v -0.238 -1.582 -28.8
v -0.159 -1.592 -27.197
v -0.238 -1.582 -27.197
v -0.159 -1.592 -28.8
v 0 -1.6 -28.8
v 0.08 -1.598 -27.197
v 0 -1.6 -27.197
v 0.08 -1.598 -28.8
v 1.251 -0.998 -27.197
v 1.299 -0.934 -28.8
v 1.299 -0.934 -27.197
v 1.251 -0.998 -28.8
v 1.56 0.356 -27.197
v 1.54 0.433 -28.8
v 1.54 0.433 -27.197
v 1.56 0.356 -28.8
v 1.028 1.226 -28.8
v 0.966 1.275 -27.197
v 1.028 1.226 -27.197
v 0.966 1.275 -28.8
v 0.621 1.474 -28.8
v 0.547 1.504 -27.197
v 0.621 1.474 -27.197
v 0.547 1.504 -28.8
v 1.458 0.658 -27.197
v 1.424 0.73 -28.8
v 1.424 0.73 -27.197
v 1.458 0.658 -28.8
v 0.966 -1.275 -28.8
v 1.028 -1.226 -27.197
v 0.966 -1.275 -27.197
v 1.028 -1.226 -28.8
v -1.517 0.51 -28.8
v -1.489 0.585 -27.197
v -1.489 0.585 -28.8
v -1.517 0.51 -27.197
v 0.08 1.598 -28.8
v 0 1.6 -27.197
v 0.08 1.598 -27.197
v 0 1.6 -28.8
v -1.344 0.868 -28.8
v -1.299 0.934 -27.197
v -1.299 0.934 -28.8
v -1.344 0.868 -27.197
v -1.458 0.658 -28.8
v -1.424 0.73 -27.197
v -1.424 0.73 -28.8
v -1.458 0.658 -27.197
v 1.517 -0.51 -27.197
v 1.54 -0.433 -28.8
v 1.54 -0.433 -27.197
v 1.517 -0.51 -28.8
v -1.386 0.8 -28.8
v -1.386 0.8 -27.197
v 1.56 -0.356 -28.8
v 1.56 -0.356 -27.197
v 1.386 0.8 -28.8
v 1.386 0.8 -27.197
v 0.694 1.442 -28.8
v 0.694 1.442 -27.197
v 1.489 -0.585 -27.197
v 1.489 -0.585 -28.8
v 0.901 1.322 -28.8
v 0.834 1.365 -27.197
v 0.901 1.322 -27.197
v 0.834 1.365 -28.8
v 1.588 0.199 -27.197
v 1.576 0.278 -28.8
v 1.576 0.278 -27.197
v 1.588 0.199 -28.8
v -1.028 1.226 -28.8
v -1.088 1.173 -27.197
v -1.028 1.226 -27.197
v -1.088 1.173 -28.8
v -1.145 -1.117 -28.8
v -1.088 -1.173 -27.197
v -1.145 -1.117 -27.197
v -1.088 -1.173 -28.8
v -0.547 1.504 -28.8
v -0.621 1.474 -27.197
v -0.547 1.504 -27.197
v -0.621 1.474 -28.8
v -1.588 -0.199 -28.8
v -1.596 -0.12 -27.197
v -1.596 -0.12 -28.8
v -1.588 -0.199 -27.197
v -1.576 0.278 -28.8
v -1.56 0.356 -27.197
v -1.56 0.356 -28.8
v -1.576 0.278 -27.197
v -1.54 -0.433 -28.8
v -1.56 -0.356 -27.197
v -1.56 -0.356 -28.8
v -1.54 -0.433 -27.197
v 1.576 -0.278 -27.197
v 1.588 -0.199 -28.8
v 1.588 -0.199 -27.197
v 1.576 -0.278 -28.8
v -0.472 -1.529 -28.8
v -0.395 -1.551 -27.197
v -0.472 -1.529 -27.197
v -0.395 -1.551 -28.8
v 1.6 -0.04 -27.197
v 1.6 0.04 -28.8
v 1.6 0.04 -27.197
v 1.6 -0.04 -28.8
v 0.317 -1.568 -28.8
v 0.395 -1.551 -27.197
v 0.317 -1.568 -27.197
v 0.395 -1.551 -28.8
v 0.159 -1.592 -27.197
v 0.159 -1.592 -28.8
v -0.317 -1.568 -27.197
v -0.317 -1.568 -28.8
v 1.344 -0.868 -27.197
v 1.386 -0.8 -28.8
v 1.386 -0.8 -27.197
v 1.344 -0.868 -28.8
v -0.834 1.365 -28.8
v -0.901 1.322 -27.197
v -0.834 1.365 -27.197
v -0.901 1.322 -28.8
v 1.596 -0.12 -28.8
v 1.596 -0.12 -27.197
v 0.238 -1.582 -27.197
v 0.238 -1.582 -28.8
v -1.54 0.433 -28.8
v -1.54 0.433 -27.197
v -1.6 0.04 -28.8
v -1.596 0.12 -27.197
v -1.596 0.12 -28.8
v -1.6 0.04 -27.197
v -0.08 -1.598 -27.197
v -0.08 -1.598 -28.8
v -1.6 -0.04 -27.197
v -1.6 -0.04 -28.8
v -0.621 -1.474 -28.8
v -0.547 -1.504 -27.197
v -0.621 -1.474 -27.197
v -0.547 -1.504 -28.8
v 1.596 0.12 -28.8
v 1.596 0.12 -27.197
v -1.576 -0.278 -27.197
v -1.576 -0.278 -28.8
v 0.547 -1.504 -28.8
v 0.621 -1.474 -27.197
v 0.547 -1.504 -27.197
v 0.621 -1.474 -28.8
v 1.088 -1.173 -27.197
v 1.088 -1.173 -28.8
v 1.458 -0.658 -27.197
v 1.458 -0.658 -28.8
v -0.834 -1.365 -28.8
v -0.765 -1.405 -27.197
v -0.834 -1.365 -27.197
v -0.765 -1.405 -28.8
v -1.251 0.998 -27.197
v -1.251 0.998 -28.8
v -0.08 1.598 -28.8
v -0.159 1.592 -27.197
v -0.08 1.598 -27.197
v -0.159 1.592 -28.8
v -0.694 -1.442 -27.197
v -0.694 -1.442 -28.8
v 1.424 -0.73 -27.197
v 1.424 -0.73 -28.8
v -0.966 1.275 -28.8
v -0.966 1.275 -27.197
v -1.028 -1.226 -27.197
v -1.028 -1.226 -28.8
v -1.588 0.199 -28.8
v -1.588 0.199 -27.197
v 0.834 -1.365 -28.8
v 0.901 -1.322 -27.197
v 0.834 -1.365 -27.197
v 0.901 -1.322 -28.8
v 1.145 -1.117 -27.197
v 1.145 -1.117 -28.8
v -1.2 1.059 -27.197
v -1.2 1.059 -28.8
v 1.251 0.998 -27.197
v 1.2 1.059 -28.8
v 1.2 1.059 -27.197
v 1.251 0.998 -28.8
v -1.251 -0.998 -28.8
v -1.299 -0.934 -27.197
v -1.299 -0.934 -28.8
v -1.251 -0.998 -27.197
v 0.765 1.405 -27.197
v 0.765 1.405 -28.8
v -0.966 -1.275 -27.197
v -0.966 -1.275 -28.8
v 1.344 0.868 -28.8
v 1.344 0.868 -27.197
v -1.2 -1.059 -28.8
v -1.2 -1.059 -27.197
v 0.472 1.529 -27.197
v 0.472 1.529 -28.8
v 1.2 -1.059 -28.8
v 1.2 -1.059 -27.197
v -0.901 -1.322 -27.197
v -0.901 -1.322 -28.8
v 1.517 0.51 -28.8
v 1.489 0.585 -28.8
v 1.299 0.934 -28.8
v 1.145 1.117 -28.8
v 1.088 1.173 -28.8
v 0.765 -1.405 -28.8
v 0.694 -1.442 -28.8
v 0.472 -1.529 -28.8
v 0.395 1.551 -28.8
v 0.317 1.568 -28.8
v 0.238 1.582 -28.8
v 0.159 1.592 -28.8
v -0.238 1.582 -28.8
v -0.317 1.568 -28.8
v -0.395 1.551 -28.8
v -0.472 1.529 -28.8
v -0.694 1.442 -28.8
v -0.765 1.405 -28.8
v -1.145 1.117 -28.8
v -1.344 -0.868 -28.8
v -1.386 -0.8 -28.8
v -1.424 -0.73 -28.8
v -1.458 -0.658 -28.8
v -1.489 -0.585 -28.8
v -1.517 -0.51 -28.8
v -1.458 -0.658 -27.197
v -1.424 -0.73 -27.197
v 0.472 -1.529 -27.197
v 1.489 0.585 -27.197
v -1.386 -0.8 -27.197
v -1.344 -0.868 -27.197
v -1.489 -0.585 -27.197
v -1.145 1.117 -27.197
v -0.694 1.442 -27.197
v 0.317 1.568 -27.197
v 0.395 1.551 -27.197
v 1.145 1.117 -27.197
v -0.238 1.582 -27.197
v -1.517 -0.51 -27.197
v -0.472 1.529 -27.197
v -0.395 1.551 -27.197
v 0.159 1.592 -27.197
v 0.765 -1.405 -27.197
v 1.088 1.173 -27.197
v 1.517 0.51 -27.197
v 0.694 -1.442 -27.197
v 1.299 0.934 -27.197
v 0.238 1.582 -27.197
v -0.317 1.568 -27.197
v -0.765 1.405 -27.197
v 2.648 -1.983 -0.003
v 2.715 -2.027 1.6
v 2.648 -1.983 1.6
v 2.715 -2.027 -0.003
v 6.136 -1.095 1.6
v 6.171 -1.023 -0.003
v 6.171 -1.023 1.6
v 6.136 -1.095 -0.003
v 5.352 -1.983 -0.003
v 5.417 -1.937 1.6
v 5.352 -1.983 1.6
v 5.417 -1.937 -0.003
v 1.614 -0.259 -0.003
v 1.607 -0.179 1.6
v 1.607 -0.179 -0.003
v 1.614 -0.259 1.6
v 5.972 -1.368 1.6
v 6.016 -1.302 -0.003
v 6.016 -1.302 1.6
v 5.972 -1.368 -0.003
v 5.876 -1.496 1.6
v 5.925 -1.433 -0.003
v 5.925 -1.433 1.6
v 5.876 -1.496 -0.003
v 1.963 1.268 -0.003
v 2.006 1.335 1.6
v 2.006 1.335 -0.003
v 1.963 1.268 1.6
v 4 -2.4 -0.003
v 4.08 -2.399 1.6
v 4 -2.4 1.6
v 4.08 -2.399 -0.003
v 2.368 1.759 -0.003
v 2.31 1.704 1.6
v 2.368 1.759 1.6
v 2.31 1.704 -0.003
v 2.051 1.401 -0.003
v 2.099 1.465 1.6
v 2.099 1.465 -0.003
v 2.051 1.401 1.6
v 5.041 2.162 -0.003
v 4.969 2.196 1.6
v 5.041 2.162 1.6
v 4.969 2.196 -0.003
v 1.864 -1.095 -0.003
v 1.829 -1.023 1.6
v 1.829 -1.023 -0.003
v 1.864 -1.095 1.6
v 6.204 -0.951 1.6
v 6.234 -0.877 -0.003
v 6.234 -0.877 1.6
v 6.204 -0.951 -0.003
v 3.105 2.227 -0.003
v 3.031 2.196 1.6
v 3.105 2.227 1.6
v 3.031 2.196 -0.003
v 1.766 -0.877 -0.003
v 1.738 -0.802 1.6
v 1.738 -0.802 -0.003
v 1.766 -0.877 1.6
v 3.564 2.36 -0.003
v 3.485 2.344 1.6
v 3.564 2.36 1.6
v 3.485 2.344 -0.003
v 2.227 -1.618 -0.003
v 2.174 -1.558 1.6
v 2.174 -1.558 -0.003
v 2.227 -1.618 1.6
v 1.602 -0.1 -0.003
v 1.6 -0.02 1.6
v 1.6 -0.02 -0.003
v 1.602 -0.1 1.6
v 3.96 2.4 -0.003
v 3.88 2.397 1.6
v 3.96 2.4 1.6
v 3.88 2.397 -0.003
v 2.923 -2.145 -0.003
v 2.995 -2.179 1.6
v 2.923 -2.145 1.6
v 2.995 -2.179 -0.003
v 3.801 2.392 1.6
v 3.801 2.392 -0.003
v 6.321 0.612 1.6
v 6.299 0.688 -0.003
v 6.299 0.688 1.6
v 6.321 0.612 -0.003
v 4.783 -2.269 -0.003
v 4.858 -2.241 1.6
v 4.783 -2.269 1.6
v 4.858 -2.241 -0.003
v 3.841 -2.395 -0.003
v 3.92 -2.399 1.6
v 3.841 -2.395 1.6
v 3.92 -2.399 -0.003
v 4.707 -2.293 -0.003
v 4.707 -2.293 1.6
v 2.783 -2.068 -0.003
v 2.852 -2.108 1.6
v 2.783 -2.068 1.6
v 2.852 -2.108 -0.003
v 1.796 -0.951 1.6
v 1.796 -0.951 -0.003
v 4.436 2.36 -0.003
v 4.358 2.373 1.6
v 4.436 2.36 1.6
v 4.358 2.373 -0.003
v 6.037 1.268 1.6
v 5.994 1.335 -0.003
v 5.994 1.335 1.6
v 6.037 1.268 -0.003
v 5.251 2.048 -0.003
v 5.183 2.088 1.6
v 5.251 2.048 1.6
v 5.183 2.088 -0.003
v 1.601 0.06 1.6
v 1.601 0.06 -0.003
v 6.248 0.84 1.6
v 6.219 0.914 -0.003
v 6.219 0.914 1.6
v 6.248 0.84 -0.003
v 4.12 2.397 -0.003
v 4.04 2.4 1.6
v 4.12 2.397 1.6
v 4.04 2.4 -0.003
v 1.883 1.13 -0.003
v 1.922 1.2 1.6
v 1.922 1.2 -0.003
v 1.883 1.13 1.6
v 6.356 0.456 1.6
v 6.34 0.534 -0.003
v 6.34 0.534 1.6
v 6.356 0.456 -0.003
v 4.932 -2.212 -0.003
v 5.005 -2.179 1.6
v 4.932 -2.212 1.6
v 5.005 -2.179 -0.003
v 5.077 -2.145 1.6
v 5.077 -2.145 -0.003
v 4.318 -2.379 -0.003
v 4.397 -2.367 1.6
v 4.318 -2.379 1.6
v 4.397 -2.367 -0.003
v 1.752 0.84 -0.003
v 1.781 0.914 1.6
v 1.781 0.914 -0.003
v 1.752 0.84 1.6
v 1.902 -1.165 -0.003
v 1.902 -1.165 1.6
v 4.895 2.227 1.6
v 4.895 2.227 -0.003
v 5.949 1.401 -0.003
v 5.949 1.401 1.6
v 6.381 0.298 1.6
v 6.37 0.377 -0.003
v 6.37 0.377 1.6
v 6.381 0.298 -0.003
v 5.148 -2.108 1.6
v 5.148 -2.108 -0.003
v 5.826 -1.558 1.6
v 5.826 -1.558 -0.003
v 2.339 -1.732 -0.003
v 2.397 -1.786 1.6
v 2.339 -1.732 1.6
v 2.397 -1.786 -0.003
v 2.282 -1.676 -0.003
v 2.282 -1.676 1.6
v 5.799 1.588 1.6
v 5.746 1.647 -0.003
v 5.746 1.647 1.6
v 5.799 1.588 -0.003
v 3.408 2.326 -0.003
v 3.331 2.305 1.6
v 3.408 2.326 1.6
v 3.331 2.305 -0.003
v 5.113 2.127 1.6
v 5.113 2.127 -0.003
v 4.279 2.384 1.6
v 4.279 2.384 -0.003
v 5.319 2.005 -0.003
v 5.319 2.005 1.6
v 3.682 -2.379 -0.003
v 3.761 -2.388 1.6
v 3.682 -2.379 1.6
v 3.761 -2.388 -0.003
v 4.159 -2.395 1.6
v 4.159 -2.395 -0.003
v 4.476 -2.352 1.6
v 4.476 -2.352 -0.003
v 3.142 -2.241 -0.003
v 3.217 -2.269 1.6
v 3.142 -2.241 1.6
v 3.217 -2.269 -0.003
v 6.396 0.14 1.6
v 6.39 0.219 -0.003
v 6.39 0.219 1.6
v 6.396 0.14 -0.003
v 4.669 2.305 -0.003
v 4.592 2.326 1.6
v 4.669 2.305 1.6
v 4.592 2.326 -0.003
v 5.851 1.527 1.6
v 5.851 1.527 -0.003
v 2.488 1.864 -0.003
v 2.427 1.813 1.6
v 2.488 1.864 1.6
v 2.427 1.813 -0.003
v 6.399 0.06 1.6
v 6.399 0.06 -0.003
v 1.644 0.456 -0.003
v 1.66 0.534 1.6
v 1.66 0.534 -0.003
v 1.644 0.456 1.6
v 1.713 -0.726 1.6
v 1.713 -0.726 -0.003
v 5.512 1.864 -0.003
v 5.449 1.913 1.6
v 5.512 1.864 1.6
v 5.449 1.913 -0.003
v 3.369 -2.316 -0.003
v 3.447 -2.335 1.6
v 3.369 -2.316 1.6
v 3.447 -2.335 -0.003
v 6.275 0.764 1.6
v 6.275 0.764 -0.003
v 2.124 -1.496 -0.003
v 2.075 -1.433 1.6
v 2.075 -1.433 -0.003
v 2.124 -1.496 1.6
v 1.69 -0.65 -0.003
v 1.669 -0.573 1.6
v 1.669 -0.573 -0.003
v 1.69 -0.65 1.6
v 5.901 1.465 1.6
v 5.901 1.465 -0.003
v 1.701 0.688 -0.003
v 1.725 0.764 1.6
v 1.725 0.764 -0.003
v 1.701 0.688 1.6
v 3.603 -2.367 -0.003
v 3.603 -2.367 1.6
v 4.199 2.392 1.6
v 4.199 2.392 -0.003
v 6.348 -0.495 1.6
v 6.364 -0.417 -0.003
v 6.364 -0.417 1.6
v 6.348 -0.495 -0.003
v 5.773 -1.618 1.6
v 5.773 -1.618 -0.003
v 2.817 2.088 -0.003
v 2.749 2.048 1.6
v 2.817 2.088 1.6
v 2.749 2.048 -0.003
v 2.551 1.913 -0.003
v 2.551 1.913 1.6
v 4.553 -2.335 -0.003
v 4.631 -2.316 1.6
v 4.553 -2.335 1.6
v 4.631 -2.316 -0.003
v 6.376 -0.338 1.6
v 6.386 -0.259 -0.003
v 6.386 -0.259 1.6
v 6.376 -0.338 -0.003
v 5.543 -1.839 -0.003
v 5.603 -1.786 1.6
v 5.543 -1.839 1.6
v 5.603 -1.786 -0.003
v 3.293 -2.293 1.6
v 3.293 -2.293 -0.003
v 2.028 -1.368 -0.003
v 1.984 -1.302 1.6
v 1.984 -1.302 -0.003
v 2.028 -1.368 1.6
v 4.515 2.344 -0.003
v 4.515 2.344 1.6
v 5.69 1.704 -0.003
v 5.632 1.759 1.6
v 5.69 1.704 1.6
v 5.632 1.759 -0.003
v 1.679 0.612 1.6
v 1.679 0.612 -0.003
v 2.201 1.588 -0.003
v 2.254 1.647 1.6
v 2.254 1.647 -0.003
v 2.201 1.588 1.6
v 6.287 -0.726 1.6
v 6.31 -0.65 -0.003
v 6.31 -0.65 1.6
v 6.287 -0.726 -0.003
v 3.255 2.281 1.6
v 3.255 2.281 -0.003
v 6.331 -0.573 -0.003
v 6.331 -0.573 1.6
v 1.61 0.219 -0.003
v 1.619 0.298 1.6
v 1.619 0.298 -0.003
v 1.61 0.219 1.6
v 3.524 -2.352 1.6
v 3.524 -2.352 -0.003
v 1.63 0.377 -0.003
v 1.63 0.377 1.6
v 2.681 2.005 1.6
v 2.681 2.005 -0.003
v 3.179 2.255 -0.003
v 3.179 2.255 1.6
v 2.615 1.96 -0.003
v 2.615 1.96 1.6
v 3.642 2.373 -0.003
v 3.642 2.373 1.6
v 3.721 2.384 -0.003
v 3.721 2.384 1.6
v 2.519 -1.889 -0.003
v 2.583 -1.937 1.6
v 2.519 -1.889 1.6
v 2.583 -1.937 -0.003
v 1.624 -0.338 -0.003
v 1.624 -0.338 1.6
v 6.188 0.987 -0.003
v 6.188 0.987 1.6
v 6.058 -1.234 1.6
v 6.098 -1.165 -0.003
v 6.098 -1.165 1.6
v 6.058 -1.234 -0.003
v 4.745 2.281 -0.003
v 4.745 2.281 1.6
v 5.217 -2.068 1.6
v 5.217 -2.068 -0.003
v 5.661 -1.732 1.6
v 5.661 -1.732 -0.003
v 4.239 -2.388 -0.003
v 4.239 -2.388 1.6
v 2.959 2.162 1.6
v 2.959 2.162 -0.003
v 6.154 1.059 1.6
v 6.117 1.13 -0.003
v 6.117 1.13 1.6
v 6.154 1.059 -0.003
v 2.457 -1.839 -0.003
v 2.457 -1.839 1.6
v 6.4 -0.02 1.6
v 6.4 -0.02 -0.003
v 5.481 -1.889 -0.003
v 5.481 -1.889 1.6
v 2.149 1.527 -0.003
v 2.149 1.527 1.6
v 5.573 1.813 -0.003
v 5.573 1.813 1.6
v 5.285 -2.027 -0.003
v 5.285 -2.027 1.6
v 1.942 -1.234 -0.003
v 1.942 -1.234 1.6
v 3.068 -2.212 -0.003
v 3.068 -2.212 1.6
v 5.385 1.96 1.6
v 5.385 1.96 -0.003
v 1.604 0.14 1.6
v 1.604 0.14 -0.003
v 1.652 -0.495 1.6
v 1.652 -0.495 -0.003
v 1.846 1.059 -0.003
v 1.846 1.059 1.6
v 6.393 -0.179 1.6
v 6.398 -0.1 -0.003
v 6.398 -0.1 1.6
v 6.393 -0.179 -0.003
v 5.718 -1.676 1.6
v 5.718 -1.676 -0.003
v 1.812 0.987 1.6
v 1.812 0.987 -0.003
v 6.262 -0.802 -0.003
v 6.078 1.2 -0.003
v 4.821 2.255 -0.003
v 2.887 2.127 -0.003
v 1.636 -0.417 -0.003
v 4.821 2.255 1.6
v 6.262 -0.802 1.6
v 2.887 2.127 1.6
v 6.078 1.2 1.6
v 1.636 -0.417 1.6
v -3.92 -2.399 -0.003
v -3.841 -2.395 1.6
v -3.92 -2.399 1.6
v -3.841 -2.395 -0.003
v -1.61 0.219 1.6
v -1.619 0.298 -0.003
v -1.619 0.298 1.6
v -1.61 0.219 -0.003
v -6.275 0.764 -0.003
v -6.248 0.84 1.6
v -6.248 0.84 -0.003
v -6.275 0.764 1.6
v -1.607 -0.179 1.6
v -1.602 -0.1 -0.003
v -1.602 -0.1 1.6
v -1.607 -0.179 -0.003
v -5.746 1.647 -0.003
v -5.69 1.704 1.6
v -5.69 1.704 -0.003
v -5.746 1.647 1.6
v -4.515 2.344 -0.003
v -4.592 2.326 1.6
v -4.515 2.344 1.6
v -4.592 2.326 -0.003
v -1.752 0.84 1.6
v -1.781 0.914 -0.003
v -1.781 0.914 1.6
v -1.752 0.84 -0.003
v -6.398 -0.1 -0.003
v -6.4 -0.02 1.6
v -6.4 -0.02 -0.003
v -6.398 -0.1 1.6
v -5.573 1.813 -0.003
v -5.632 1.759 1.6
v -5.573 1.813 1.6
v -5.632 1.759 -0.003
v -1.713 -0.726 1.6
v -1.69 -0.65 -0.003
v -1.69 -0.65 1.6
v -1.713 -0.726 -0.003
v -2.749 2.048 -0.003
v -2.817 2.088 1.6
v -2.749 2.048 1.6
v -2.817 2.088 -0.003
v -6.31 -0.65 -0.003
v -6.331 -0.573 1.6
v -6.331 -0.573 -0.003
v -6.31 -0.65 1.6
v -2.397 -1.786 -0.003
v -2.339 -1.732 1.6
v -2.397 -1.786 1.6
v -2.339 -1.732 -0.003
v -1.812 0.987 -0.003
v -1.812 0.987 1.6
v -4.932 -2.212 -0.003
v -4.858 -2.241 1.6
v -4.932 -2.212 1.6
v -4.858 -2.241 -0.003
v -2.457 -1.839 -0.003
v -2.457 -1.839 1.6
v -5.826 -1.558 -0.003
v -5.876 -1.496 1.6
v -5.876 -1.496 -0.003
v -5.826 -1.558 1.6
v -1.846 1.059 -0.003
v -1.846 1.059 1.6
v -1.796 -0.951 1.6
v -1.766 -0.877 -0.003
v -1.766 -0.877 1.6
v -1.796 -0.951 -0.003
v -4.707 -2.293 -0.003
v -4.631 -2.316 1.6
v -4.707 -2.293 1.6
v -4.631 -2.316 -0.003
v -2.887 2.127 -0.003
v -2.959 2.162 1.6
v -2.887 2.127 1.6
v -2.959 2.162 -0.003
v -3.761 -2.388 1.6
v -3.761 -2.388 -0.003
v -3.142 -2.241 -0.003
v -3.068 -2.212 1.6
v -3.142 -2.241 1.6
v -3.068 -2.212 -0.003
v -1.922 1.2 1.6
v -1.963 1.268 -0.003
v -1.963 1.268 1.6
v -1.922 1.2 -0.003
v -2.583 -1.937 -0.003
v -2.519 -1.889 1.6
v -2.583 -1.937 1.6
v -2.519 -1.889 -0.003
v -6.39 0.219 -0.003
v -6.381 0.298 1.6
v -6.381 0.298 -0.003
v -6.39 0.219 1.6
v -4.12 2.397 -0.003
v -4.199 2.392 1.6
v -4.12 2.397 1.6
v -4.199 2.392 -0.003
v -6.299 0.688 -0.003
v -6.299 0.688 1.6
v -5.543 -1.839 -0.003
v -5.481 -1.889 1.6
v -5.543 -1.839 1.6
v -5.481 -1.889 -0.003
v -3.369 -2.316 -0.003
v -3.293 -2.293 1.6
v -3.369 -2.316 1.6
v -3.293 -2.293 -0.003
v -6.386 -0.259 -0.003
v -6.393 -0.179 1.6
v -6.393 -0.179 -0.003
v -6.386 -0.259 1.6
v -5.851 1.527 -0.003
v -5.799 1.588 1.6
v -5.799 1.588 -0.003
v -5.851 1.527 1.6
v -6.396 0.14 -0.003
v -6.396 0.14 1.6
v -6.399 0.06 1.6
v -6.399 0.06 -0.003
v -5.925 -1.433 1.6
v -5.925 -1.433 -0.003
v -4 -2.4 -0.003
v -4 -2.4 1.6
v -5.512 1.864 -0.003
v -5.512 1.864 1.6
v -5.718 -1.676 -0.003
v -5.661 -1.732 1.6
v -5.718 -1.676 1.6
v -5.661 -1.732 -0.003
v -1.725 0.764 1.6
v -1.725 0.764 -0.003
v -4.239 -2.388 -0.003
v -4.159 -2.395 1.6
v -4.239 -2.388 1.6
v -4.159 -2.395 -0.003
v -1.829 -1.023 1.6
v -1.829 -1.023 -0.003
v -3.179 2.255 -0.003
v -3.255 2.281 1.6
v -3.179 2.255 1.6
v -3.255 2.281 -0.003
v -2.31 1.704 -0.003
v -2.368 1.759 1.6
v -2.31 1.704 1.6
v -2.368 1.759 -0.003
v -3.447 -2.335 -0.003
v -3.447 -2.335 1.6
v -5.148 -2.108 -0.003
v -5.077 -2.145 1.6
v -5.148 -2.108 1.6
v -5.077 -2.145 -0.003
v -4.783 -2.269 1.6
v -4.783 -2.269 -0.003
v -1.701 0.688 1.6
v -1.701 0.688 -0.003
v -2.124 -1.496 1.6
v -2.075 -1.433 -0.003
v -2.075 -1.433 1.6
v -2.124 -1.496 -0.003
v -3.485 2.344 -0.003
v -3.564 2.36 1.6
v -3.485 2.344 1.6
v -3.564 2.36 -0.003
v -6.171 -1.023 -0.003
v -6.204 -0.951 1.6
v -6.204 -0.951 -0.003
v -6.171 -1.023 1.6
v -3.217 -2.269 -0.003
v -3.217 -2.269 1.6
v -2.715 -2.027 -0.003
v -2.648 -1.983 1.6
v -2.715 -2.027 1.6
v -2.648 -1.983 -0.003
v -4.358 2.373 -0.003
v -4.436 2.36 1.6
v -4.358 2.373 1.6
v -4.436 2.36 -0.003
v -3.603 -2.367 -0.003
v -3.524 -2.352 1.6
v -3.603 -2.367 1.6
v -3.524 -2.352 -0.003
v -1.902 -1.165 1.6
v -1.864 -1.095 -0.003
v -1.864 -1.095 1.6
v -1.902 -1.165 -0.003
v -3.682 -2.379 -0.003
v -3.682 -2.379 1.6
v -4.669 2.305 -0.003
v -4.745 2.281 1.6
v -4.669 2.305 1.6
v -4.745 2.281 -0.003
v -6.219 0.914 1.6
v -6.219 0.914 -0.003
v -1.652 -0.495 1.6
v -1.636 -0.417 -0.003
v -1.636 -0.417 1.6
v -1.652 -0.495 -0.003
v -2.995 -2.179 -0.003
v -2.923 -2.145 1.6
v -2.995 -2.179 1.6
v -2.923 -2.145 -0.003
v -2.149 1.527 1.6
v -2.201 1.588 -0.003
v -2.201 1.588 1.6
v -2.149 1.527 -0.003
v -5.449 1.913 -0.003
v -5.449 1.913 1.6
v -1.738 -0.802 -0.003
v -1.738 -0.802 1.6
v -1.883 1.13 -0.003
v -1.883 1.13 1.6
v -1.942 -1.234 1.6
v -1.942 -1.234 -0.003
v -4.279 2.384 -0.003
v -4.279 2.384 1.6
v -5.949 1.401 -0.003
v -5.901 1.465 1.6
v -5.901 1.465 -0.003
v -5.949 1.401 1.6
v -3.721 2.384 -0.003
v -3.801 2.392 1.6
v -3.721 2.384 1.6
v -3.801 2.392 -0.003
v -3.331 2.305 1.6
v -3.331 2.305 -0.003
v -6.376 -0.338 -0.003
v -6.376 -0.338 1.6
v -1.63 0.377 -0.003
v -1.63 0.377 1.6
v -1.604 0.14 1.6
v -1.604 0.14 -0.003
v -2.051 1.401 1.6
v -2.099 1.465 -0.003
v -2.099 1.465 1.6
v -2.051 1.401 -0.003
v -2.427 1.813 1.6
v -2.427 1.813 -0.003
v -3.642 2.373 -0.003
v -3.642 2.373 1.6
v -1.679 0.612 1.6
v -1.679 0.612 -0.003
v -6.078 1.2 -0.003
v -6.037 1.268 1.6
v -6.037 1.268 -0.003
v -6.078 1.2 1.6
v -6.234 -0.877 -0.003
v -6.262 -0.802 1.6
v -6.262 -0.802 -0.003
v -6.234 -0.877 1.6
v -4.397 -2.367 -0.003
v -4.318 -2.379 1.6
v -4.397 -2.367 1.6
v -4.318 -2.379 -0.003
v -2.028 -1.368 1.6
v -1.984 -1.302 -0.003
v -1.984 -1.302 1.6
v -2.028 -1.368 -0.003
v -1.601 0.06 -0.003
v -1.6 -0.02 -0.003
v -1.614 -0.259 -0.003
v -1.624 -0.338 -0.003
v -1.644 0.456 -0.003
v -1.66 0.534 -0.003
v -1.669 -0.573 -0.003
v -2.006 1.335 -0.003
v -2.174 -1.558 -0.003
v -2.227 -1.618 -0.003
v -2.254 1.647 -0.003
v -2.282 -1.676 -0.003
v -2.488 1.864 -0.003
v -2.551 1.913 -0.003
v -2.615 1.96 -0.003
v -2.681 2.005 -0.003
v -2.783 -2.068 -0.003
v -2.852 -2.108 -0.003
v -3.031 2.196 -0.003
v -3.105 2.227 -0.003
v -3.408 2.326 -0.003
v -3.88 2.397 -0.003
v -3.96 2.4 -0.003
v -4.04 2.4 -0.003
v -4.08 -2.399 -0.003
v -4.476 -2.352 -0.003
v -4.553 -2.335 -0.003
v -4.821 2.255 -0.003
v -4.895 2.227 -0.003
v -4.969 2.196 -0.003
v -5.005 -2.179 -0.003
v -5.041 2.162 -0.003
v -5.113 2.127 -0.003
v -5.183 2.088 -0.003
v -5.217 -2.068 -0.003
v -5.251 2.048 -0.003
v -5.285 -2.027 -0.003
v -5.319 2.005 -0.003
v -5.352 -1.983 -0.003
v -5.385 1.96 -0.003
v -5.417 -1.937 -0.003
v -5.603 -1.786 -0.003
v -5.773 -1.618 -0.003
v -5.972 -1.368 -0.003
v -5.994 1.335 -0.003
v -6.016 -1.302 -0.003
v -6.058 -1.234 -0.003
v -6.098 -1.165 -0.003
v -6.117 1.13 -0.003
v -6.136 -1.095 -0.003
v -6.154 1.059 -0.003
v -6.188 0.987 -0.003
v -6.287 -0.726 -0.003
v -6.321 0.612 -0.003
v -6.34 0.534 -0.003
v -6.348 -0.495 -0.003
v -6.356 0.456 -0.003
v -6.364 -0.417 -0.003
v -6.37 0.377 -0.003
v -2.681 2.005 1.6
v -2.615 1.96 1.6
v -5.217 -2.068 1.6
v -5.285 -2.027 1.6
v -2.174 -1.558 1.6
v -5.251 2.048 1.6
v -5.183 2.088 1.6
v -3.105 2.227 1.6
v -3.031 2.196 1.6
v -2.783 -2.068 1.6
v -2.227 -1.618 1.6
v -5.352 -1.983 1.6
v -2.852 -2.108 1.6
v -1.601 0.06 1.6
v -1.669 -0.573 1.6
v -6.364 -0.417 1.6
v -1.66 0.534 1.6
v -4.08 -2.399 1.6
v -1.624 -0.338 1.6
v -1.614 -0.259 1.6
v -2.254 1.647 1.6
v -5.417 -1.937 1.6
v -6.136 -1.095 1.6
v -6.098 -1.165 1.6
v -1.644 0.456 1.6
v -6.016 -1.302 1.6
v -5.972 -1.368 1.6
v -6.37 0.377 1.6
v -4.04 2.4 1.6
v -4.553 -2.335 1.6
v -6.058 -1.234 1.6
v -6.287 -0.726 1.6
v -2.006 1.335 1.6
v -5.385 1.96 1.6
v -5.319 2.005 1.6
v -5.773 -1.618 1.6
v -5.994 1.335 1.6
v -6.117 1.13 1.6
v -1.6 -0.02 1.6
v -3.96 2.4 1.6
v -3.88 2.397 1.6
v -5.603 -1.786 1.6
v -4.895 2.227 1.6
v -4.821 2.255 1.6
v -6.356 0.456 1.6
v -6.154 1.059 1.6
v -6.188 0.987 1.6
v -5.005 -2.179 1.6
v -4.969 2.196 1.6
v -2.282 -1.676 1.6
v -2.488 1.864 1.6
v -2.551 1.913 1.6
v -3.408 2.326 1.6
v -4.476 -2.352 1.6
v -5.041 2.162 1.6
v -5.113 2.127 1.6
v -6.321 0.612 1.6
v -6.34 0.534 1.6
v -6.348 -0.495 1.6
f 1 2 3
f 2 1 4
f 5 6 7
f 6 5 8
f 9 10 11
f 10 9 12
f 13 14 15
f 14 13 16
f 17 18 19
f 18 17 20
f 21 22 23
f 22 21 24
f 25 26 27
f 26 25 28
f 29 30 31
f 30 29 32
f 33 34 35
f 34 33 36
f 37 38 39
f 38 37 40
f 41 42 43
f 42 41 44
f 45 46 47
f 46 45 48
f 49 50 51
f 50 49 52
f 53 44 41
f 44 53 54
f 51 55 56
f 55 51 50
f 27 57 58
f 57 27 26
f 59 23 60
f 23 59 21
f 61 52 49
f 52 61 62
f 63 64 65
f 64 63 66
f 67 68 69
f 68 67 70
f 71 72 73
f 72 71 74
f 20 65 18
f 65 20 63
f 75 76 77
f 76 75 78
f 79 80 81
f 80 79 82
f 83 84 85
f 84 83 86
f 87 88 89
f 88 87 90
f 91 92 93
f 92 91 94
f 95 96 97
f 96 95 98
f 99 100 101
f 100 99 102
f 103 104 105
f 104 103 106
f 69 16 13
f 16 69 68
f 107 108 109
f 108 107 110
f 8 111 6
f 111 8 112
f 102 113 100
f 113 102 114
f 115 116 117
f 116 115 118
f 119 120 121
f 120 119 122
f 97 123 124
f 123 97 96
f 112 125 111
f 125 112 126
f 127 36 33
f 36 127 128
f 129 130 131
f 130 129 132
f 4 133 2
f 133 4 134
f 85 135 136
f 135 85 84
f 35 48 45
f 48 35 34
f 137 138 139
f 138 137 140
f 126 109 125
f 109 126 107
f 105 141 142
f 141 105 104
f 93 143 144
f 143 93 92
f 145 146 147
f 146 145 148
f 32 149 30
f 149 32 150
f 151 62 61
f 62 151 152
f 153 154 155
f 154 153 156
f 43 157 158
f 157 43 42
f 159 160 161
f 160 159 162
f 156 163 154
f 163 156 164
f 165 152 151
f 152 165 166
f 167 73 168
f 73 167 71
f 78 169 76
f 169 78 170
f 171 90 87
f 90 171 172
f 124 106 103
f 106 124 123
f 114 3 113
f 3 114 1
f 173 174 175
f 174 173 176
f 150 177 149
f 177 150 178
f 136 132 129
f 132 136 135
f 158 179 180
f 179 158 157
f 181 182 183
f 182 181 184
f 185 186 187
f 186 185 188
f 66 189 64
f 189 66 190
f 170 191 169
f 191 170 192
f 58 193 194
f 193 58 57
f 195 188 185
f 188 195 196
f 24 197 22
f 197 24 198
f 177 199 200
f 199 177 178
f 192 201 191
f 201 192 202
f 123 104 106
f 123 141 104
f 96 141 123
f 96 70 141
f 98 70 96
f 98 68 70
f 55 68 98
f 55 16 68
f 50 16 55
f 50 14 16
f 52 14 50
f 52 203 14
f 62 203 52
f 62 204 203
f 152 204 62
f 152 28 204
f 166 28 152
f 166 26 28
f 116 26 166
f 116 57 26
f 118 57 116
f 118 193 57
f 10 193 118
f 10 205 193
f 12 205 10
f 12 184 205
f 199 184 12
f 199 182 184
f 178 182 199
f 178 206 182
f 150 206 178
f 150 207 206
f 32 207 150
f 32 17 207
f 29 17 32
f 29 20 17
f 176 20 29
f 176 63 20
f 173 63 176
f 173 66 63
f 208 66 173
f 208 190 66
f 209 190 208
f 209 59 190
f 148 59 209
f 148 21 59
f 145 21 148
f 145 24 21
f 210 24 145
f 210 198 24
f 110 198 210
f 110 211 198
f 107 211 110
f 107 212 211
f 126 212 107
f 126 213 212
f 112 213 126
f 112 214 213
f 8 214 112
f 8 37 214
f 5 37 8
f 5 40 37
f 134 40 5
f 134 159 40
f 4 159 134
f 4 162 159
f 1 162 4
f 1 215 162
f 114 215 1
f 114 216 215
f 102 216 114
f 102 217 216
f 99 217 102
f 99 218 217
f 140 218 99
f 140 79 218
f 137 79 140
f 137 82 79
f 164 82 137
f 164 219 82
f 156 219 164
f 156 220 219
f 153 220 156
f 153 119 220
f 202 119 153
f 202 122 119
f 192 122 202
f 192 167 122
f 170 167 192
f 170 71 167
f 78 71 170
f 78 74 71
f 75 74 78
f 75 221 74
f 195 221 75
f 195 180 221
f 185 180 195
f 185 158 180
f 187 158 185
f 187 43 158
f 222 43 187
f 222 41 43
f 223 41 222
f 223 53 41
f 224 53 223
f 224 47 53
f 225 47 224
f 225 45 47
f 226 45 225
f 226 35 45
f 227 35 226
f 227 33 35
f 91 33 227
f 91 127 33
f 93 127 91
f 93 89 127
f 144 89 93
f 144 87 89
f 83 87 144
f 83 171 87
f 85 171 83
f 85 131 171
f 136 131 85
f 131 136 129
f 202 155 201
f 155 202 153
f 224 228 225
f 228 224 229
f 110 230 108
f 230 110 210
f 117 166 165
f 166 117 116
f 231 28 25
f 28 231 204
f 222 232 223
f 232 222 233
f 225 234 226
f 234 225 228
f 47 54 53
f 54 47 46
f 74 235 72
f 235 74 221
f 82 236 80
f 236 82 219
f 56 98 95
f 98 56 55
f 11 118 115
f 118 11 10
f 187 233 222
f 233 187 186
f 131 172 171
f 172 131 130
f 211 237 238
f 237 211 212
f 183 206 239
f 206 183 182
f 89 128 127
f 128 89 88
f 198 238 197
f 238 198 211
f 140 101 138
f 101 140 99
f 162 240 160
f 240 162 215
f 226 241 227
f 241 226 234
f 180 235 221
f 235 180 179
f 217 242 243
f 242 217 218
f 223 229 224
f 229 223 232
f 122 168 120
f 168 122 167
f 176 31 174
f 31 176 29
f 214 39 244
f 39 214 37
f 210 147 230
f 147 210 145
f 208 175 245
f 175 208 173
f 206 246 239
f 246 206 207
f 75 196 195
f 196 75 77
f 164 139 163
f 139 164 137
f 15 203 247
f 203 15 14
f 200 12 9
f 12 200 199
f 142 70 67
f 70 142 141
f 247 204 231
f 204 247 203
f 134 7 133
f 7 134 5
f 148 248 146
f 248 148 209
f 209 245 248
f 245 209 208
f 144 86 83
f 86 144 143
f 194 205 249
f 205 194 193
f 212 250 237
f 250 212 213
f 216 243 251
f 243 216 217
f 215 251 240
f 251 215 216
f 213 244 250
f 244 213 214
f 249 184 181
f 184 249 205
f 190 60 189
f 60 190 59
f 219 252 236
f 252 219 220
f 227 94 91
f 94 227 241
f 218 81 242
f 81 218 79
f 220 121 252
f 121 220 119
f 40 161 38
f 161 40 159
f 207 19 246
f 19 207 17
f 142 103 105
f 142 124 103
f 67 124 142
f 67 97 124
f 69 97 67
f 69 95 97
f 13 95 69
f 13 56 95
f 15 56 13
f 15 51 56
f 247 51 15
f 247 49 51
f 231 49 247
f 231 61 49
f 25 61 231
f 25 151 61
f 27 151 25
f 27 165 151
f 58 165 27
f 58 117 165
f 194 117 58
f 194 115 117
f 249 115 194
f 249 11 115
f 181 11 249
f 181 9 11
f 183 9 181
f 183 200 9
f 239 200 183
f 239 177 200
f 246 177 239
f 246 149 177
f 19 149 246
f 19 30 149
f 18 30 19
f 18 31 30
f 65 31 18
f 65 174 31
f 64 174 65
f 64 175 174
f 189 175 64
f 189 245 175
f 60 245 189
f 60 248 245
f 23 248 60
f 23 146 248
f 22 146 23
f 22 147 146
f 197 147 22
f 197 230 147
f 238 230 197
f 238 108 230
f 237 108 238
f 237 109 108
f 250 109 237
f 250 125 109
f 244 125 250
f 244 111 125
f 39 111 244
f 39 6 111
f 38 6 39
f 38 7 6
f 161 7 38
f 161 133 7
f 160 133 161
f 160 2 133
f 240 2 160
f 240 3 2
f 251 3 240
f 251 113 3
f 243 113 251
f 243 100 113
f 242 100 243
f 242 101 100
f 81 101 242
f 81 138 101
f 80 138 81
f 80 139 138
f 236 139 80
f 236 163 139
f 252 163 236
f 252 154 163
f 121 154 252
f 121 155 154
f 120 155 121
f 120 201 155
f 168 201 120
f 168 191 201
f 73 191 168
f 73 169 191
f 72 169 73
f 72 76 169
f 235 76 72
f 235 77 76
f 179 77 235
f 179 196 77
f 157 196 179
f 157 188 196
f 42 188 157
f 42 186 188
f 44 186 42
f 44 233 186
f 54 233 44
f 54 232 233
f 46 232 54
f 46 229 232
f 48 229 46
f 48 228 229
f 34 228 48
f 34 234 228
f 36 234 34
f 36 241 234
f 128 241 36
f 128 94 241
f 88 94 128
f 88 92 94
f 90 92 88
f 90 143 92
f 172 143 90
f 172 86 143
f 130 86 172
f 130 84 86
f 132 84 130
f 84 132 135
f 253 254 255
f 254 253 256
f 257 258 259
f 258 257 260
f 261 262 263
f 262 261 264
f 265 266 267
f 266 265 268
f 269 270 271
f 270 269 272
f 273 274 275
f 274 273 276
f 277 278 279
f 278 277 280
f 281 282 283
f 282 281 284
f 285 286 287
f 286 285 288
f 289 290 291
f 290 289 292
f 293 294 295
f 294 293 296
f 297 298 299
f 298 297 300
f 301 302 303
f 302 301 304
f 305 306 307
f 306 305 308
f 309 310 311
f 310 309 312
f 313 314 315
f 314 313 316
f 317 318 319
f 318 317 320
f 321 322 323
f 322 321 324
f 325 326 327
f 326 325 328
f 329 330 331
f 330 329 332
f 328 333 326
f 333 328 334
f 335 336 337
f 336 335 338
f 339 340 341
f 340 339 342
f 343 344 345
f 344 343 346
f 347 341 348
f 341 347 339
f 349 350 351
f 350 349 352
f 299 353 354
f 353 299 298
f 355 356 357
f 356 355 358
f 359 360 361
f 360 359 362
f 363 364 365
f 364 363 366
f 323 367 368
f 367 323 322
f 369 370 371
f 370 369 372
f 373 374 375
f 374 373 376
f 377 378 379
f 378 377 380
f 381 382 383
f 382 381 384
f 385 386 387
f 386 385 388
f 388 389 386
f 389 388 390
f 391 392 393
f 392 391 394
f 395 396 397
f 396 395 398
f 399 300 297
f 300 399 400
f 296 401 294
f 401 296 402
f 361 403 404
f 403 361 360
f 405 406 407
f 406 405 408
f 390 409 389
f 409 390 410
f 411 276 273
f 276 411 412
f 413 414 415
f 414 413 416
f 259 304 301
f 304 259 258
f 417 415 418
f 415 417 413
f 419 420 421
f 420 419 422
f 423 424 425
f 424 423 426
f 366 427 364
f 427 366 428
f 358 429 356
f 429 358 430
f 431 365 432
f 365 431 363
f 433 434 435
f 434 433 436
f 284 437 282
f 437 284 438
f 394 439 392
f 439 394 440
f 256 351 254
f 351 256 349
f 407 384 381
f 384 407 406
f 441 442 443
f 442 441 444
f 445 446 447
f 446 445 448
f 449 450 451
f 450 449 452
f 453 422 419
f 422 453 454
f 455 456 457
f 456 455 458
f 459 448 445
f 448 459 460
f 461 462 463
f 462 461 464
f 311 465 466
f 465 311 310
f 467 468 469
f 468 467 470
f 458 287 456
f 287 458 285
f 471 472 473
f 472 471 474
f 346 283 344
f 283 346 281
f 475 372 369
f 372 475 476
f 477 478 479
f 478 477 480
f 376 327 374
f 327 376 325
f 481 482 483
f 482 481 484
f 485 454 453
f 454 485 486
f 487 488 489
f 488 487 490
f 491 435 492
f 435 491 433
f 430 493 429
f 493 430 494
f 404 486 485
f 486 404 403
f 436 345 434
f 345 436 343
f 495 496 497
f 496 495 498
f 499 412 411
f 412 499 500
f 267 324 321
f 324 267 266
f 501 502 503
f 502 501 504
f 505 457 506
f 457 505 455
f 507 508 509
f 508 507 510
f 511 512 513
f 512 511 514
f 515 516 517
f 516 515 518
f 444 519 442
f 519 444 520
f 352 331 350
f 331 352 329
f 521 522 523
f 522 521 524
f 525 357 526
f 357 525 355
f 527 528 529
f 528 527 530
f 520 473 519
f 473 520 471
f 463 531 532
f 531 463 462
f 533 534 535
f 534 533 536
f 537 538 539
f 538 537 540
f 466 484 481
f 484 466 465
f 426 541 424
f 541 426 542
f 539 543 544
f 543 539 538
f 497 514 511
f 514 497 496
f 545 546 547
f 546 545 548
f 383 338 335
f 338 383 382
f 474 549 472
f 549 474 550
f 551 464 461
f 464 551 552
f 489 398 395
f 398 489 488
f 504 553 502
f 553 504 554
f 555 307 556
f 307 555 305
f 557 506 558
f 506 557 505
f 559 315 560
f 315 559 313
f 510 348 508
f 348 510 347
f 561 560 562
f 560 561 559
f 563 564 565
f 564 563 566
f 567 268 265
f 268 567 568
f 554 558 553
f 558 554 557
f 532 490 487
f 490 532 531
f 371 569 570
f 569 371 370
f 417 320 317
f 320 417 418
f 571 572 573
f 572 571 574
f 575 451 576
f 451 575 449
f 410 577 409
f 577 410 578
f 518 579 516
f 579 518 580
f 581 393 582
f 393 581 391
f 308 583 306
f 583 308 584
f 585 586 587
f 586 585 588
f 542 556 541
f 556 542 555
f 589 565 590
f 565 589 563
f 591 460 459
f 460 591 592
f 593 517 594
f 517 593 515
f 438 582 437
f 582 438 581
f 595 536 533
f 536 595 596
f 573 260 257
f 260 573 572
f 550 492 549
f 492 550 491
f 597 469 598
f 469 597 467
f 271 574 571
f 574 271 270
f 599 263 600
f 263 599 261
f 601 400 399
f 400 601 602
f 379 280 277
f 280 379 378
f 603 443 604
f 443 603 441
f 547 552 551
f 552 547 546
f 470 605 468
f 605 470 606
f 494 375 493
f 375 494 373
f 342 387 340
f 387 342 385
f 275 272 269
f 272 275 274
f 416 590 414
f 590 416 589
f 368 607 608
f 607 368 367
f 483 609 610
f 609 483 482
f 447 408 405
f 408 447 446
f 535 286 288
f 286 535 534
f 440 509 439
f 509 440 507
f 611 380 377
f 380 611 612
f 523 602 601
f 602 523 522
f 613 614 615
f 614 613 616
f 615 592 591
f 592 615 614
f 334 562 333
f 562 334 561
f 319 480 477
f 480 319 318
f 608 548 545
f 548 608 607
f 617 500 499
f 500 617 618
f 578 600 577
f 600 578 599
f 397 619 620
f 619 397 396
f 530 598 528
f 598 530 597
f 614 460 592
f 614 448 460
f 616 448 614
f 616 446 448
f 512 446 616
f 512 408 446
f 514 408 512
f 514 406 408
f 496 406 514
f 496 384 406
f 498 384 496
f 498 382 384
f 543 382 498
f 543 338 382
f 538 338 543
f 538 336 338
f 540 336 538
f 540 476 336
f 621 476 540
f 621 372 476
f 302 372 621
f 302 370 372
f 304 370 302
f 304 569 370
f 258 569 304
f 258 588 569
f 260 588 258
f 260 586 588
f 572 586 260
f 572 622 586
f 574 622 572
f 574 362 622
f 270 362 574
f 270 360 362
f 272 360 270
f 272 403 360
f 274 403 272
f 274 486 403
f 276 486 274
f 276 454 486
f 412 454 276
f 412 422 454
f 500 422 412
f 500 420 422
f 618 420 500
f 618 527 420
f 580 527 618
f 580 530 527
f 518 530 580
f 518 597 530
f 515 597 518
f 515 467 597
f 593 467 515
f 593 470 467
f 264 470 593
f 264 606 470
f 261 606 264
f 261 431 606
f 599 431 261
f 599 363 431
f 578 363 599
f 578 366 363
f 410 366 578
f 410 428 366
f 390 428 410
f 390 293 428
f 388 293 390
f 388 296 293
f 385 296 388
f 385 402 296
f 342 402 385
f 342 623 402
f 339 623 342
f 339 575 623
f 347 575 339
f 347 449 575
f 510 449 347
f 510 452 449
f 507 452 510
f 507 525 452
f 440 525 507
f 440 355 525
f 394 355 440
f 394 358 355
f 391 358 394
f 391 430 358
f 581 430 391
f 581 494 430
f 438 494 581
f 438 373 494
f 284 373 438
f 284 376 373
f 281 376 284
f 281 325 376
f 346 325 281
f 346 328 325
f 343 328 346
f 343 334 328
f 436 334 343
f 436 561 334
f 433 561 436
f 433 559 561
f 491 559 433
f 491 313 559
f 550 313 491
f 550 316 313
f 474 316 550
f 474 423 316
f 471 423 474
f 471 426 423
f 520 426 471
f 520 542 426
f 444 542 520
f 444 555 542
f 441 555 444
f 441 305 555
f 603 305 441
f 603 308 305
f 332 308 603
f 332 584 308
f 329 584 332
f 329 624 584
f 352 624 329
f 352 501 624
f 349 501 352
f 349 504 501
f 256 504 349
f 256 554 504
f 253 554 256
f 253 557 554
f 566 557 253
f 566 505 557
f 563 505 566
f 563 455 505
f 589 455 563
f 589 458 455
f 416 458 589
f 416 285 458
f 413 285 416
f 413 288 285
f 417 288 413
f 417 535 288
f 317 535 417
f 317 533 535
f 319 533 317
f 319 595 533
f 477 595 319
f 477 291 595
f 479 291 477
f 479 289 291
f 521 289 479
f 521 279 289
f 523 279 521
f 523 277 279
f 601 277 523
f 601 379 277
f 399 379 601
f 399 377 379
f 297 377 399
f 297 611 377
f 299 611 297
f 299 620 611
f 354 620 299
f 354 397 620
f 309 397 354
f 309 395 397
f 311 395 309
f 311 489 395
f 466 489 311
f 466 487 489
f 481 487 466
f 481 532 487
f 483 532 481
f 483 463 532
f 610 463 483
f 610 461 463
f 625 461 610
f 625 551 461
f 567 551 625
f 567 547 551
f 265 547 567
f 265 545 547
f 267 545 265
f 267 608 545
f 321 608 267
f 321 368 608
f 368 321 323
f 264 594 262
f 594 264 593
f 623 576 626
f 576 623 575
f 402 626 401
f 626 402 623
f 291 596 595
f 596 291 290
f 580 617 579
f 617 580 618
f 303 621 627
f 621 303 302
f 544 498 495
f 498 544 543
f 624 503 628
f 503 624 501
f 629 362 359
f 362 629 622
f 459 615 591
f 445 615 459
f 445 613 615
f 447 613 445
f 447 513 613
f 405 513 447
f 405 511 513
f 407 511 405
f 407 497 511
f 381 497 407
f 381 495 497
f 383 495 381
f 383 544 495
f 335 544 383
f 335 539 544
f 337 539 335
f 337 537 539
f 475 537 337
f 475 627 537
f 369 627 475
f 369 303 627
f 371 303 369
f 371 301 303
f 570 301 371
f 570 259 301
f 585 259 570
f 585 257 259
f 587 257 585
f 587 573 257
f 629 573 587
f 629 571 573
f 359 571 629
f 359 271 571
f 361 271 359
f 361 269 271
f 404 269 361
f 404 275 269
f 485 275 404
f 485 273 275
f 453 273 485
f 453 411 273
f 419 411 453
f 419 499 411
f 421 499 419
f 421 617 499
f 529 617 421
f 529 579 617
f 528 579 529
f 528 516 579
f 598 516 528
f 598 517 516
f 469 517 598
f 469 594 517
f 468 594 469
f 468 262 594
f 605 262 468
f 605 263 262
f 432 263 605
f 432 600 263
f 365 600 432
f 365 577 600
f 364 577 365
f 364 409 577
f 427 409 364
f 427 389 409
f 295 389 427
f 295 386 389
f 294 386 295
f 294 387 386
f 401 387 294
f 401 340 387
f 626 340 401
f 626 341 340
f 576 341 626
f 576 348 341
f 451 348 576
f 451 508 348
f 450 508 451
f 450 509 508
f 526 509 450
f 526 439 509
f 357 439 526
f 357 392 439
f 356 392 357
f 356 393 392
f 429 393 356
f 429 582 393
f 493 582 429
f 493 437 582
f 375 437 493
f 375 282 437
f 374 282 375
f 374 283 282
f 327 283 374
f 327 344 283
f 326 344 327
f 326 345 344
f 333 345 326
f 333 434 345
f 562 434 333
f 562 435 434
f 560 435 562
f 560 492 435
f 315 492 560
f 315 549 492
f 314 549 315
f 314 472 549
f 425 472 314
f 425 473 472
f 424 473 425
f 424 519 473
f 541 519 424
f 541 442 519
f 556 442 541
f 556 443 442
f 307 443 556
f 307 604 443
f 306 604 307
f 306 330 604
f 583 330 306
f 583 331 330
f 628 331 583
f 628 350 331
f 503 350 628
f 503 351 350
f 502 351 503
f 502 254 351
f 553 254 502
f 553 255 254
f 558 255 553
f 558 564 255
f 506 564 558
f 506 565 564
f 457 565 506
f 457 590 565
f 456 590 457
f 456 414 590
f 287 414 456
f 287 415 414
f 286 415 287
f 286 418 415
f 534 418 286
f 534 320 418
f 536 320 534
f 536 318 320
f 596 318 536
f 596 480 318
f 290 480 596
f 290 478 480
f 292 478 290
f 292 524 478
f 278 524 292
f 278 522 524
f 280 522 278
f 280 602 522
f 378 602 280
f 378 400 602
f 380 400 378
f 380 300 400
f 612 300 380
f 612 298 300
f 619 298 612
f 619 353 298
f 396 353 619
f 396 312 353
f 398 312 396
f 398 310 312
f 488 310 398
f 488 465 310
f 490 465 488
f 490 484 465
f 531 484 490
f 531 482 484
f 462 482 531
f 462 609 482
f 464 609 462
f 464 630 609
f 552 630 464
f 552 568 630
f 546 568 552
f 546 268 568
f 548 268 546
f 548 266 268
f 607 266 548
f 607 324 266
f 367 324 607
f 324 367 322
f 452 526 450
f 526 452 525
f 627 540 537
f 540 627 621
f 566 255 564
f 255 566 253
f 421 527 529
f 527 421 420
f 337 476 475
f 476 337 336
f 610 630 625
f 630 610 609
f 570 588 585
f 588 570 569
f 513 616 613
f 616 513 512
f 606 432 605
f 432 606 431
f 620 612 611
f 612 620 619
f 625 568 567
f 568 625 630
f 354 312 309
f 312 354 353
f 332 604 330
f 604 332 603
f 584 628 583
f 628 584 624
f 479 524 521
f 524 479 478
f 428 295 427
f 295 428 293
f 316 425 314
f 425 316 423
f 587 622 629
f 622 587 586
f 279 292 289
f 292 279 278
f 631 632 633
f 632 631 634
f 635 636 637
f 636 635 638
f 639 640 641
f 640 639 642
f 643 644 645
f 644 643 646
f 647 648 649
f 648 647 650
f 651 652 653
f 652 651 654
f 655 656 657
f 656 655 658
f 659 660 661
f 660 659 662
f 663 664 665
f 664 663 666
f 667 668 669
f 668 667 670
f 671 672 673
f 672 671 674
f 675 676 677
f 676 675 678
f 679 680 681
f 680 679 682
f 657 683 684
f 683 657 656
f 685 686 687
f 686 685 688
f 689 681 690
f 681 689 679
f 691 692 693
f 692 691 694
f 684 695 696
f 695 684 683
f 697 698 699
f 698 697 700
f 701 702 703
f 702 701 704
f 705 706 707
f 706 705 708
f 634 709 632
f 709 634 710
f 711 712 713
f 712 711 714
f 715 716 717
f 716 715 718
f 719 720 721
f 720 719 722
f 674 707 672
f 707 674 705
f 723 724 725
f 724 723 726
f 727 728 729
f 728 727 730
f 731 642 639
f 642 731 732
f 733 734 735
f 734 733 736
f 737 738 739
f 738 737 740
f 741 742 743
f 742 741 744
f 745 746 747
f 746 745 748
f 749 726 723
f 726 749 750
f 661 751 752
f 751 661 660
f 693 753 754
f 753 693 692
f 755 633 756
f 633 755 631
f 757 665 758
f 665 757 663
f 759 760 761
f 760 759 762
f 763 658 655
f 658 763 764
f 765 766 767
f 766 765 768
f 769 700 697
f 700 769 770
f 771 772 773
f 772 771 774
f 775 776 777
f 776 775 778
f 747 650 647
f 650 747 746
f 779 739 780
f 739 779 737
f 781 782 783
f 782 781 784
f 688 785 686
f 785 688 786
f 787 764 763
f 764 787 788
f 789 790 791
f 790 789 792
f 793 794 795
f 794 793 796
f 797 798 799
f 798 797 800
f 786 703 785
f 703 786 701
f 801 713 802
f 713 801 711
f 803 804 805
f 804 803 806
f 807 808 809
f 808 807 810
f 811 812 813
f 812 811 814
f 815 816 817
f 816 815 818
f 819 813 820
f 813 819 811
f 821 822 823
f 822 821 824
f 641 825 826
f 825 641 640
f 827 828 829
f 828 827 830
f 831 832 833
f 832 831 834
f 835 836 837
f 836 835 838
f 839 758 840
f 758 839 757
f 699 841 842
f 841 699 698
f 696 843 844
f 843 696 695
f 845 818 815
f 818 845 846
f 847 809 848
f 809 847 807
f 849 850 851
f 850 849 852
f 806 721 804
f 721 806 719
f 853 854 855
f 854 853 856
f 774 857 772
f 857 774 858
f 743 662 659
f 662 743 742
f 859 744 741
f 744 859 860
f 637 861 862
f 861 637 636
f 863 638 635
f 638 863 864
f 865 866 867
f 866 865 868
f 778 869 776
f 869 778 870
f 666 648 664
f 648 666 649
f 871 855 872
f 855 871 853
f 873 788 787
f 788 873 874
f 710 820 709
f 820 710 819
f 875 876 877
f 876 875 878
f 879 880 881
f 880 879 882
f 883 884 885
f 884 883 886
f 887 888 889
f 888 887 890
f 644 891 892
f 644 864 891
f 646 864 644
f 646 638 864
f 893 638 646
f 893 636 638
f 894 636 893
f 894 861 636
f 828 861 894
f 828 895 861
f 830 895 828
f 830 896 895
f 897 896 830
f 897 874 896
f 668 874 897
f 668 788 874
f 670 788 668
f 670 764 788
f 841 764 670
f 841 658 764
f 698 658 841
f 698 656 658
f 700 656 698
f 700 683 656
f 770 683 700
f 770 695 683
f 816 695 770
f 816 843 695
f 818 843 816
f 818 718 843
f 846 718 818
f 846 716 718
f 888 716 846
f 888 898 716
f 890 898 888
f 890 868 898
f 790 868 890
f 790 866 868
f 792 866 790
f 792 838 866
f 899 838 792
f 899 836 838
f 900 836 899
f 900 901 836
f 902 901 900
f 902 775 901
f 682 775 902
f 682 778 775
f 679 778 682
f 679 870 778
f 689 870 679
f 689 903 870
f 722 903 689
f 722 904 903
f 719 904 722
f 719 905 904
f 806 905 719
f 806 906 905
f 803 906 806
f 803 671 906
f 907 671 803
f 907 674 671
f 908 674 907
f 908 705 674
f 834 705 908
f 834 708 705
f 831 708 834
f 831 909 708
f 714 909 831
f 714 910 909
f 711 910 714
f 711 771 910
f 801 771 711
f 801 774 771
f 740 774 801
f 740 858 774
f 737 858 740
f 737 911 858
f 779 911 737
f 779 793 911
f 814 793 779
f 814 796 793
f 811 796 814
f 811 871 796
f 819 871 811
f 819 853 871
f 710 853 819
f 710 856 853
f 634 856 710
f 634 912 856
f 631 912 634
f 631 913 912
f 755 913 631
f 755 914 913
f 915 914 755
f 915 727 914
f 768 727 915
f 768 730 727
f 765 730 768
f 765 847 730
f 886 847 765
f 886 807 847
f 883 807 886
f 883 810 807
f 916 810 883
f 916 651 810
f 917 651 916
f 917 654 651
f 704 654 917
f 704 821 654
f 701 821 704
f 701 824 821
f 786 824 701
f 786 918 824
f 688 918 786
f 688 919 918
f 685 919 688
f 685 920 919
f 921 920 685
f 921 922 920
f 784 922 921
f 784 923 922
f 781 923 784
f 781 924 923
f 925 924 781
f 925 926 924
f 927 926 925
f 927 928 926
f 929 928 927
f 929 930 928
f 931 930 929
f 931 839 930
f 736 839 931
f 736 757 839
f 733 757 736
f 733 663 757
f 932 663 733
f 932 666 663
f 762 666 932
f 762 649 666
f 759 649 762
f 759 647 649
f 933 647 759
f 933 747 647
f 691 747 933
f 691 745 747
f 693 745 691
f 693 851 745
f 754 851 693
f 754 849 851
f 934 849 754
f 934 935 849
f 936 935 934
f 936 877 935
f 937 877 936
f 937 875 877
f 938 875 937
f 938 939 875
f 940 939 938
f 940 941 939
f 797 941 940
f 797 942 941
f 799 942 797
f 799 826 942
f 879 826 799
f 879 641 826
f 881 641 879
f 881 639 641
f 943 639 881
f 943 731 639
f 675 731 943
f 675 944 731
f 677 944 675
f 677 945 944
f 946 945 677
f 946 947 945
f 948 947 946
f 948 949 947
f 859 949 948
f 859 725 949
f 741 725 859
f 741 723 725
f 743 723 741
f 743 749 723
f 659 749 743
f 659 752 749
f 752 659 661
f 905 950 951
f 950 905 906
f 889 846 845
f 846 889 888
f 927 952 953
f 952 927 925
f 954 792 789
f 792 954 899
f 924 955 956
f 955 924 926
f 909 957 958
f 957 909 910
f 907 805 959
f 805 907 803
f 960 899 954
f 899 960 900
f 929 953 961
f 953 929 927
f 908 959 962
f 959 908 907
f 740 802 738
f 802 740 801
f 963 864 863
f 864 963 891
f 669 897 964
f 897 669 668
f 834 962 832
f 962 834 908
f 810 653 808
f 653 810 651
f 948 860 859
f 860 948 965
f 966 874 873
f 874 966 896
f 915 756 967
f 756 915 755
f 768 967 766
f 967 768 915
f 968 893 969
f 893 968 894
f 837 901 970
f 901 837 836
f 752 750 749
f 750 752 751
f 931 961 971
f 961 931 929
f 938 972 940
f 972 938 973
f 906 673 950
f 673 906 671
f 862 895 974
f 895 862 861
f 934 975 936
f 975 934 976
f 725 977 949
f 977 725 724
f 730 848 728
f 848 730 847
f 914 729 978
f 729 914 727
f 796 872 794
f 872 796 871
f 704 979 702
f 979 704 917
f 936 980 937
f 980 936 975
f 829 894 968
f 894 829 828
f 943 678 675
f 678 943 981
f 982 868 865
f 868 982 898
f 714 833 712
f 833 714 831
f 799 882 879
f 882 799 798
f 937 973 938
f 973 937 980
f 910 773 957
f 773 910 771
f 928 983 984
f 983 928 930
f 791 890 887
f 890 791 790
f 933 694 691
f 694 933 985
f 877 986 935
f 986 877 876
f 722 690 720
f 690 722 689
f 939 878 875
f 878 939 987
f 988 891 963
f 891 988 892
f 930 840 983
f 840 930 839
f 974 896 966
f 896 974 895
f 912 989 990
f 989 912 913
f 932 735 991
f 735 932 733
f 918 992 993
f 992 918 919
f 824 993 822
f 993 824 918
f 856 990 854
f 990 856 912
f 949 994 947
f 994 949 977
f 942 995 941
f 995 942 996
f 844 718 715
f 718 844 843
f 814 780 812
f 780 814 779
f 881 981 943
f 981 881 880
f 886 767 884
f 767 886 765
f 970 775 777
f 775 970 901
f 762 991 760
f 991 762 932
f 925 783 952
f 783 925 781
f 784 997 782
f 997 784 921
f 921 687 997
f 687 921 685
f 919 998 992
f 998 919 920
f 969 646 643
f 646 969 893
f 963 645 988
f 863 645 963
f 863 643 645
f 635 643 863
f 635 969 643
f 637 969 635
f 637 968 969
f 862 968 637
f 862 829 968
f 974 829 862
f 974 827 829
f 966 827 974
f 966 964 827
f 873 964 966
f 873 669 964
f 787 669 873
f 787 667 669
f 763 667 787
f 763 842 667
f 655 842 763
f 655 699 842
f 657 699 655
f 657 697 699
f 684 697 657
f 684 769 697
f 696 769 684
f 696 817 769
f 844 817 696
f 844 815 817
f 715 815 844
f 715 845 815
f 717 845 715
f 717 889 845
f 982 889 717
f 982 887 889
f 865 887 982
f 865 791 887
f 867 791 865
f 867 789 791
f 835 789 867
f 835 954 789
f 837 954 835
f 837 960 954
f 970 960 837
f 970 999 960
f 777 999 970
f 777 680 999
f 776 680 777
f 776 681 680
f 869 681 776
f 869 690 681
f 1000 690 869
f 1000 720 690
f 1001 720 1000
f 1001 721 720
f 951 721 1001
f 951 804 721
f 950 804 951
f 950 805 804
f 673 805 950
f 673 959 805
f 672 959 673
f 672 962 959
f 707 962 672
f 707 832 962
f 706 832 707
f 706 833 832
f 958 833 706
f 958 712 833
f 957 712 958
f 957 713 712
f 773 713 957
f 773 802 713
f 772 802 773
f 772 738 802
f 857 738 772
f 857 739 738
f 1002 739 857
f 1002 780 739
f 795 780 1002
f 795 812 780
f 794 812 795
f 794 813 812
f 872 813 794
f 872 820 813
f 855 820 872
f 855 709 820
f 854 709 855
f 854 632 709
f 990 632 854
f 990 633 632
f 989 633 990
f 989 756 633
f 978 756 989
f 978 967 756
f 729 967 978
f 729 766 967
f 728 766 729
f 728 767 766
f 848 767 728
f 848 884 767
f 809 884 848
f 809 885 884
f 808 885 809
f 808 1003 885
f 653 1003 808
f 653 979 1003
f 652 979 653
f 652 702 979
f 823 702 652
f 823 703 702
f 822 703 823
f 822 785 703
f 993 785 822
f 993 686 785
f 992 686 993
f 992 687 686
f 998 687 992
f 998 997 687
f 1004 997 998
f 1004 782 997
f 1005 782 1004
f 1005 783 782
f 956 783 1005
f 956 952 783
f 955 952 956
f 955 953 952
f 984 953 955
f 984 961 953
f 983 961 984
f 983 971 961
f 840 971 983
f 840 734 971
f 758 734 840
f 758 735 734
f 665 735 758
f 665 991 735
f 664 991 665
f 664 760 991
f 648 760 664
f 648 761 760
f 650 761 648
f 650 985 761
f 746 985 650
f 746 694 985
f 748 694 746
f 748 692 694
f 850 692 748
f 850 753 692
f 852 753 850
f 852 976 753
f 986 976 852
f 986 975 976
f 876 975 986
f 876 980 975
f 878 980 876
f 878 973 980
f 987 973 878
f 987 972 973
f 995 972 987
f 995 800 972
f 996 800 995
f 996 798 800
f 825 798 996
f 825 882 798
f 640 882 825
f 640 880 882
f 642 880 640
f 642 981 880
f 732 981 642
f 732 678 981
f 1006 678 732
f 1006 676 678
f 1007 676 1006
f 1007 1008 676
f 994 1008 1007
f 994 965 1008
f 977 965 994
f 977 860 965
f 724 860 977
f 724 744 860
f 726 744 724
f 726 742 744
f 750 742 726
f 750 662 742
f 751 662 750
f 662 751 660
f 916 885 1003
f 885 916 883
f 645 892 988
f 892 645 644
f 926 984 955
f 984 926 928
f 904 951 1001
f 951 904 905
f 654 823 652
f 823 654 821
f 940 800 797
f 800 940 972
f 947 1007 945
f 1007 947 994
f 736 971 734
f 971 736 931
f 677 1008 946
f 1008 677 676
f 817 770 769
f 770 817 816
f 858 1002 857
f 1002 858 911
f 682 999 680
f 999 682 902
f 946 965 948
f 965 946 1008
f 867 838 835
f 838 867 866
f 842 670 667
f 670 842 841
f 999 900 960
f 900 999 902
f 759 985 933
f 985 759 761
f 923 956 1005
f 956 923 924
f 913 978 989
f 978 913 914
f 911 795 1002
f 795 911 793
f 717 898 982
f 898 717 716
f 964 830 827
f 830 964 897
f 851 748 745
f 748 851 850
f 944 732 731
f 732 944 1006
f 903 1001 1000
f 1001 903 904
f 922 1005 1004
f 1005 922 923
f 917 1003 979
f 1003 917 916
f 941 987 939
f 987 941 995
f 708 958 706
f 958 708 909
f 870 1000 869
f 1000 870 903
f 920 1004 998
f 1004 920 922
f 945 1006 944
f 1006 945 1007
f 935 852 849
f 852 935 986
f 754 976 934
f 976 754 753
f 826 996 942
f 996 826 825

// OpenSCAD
use <../lib.scad>
use <2362ap54.scad>
$fa=1; $fs=0.2;
function ldraw_lib__2362p54(realsolid=false) = [
// 0 ~Moved to 2362ap54
// 0 Name: 2362p54.dat
// 0 Author: [PTadmin]
// 0 !LDRAW_ORG Part UPDATE 2004-03
// 0 !LICENSE Licensed under CC BY 4.0 : see CAreadme.txt
// 
// 0 BFC CERTIFY CCW
  [0,"BFC","CERTIFY"],
  [0,"BFC","CCW"],
// 
// 0 !HISTORY 2003-03-12 [PTadmin] Official Update 2003-01
// 0 !HISTORY 2004-09-15 [PTadmin] Official Update 2004-03
// 0 !HISTORY 2007-05-08 [PTadmin] Header formatted for Contributor Agreement
// 0 !HISTORY 2008-07-01 [PTadmin] Official Update 2008-01
// 
// 
// 1 16 0 0 0 1 0 0 0 1 0 0 0 1 2362ap54.dat
  [1,16,0,0,0,1,0,0,0,1,0,0,0,1, ldraw_lib__2362ap54(realsolid)],
];
module ldraw_lib__2362p54(step=0, col=false, unit=2/5, alt=false, line=0.2, solid=!$preview)
    makepoly(ldraw_lib__2362p54(solid), step=step, col=col, unit=unit, alt=alt, line=line, solid=solid);
ldraw_lib__2362p54(line=0.2);
